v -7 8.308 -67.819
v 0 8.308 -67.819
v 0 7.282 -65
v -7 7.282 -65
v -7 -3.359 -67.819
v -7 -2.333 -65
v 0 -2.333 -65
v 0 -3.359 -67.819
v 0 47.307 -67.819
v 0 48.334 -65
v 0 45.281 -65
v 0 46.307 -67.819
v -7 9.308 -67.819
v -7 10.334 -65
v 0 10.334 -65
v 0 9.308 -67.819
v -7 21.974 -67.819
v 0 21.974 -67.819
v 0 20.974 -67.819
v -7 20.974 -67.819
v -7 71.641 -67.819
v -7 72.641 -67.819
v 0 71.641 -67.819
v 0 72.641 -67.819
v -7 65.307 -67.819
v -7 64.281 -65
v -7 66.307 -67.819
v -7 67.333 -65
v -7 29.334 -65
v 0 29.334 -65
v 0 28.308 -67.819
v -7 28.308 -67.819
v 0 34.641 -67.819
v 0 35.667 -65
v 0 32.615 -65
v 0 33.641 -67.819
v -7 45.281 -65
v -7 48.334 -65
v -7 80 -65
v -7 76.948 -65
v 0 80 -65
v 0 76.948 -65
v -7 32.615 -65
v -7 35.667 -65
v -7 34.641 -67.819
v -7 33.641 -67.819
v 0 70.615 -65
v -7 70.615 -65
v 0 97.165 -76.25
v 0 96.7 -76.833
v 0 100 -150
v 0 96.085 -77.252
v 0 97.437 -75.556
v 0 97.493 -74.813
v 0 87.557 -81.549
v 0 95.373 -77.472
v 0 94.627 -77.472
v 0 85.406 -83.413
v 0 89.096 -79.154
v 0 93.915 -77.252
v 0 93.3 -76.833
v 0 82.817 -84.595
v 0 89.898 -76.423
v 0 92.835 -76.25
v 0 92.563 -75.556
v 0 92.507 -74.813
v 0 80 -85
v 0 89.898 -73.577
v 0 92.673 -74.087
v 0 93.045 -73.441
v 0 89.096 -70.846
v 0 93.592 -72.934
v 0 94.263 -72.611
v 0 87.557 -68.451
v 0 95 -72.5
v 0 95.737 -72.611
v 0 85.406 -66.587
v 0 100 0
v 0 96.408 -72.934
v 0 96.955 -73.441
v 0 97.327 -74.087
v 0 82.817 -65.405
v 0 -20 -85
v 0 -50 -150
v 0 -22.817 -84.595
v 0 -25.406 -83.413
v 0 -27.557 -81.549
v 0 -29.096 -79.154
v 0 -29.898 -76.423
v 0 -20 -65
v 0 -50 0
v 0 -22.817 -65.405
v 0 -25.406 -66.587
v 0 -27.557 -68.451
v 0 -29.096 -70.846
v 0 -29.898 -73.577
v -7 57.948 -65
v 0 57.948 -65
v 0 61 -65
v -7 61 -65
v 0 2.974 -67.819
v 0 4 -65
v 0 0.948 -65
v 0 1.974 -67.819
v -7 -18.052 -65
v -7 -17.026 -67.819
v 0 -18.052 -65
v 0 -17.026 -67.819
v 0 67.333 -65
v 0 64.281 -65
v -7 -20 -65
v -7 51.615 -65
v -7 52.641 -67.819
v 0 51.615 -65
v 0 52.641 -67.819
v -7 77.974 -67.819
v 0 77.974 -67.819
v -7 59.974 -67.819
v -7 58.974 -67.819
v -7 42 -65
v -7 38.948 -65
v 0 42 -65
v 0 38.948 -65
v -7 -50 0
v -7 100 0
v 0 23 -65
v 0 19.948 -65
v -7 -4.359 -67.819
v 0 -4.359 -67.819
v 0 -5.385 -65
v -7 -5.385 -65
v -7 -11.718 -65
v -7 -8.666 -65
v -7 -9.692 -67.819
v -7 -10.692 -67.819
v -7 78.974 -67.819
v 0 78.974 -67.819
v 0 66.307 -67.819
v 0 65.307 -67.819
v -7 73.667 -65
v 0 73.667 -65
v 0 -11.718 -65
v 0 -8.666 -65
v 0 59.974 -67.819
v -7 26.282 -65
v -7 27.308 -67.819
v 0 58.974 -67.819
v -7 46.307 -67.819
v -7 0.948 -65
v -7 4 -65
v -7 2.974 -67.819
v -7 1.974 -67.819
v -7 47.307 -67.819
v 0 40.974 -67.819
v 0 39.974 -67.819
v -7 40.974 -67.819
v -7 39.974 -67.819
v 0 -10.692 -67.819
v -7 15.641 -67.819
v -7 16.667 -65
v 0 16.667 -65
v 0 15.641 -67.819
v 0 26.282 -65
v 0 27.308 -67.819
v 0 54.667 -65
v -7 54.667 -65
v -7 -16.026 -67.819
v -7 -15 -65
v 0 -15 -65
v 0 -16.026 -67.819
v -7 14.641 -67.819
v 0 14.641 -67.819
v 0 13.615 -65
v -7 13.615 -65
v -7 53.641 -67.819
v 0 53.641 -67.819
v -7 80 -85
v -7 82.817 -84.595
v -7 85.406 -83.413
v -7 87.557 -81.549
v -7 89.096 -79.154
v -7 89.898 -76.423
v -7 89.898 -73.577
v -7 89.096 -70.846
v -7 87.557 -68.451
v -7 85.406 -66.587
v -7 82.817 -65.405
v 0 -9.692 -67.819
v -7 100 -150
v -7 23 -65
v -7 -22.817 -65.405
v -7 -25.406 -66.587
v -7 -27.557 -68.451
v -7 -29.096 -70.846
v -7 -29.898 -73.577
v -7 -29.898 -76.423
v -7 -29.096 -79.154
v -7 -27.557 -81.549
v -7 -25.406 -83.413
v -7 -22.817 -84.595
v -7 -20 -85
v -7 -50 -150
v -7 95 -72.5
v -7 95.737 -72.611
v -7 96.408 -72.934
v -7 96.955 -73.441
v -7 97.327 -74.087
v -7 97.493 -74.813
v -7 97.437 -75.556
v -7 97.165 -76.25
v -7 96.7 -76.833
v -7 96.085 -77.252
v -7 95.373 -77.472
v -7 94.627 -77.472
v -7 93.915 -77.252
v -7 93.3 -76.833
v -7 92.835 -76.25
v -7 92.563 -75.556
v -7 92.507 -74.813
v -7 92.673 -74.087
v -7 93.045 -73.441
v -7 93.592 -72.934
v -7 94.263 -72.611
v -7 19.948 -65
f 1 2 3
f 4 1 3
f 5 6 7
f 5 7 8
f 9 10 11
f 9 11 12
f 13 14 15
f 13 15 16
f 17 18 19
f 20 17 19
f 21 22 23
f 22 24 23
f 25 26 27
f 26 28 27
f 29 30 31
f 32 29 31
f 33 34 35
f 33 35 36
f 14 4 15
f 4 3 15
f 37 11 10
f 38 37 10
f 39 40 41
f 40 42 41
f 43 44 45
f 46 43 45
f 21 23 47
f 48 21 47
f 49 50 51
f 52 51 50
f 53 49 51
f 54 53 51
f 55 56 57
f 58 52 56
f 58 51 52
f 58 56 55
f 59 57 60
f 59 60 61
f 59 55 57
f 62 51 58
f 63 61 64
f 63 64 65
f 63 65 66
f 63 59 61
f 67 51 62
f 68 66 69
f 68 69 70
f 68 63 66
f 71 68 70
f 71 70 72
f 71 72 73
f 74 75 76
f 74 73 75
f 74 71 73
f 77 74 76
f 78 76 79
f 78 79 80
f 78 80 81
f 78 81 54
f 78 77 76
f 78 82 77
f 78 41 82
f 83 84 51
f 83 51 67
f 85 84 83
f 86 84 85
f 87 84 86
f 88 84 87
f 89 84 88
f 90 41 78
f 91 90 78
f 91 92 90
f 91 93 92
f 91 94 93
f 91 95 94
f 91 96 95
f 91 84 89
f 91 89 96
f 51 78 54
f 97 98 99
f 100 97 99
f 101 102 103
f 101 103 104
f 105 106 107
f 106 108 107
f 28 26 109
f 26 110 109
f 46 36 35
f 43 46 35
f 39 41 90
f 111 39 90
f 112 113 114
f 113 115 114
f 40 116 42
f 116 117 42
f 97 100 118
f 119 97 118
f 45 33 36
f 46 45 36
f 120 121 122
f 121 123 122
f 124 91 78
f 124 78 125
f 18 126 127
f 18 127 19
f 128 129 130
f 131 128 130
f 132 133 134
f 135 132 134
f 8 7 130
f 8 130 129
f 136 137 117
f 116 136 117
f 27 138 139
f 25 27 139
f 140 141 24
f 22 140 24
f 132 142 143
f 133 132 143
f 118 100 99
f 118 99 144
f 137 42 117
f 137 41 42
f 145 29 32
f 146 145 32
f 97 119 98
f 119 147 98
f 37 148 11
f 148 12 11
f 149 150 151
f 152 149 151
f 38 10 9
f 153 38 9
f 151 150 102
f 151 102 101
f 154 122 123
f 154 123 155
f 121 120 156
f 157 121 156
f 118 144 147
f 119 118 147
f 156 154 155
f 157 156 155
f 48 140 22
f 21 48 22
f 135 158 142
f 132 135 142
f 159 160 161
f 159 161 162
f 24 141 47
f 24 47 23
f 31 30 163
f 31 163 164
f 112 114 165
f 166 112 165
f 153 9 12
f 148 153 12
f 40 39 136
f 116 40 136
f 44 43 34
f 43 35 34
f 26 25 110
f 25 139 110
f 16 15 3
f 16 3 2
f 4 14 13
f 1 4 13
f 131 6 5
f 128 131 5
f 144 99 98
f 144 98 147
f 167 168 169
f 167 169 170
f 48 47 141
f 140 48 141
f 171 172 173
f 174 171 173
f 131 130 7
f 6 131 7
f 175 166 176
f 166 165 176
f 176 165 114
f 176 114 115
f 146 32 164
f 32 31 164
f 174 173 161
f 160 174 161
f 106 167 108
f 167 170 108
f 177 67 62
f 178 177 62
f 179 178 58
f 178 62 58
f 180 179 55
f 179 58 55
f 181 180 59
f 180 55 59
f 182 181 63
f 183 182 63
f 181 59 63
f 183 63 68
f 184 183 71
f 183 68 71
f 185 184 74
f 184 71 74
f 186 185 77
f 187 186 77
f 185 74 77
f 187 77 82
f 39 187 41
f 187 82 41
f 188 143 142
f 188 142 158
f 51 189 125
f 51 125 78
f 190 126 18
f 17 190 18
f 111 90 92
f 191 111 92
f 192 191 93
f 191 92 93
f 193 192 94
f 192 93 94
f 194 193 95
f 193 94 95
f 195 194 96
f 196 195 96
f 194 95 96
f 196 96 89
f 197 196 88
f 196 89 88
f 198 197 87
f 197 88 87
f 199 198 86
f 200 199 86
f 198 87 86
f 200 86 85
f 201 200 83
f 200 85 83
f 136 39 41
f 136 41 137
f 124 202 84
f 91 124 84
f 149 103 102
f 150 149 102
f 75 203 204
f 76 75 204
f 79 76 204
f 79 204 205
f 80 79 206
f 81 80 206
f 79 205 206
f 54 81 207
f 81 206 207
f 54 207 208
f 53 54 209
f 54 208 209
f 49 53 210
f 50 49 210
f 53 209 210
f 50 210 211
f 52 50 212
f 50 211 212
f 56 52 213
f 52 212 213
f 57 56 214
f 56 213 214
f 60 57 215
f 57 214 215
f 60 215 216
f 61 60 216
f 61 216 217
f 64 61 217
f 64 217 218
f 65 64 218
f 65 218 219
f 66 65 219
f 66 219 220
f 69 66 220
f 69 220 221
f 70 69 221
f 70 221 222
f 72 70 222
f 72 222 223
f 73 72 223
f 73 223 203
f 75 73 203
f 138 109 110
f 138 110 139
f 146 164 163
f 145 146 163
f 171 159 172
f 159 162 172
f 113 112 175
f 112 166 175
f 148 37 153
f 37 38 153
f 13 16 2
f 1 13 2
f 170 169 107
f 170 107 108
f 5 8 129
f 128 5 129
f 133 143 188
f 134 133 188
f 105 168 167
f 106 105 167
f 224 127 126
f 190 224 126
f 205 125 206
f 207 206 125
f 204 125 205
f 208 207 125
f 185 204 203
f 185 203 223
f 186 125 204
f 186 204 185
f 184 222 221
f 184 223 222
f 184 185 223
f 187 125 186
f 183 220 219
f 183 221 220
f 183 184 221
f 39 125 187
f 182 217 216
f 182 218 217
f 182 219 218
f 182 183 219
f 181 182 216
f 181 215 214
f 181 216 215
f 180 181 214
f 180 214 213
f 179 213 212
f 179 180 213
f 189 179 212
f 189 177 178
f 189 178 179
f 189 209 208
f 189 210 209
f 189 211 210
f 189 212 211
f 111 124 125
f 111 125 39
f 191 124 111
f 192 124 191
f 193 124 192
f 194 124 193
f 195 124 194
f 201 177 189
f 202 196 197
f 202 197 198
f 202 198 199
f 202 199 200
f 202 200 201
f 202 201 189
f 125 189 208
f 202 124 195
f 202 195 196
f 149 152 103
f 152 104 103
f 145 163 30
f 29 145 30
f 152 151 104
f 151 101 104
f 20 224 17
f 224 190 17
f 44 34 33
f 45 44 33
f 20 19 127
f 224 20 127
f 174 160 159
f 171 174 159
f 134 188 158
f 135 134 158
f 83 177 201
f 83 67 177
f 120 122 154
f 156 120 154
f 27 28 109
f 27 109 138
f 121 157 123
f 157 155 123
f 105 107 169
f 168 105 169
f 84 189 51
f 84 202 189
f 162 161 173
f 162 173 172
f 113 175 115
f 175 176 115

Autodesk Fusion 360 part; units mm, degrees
sketch "Sketch1" plane through (0, 0, 0) normal (0, 1, 0) x (1, 0, 0)
  line L0 (-7, 150) -> (0, 150)
  line L1 (0, 150) -> (0, 0)
  line L2 (0, 0) -> (-7, 0)
  line L3 (-7, 0) -> (-7, 150)
  dimension "d1" = 7
  dimension "d2" = 150
extrude "Extrude1" add sketch "Sketch1" along normal blind 100 and the other way blind 50 makes body 1
sketch "Sketch3" plane through (0, 0, 0) normal (1, 0, 0) x (0, 0, -1)
  line L0 (150, -50) -> (150, 100)
  line L1 (150, 100) -> (0, 100)
  line L2 (0, 100) -> (0, -50)
  line L3 (0, -50) -> (150, -50)
  line L4 (65, 80) -> (65, -20)
  line L5 (85, 80) -> (85, -20)
  arc A0 (85, 80) -> (65, 80) centre (75, 80) ccw
  arc A1 (65, -20) -> (85, -20) centre (75, -20) ccw
  dimension "d5" = 100
  dimension "d6" = 100
  dimension "d9" = 20
  dimension "d10" = 65
extrude "Extrude2" cut sketch "Sketch3" against normal blind 60 contours L4 L5 A0 A1 bodies 1
sketch "草图4" plane through (-7, 0, 0) normal (-1, 0, 0) x (0, 0, 1)
  line L0 (-65, 80) -> (-65, -20)
  arc A0 (-85, -20) -> (-65, -20) centre (-75, -20) ccw
  line L1 (-85, -20) -> (-85, 80)
  arc A1 (-65, 80) -> (-85, 80) centre (-75, 80) ccw
  line L2 (0, -50) -> (0, 100)
  line L3 (0, 100) -> (-150, 100)
  line L4 (-150, 100) -> (-150, -50)
  line L5 (-150, -50) -> (0, -50)
  circle A2 centre (-75, 95) radius 2.5
  dimension "d13" = 5
  dimension "d14" = 5
extrude "拉伸3" cut sketch "草图4" against normal through all contours A2 bodies 1
sketch "草图5" plane through (0, 0, 0) normal (1, 0, 0) x (0, 0, -1)
  circle A0 centre (75, 95) radius 2.5
  line L0 (65, -20) -> (65, 80)
  arc A1 (85, 80) -> (65, 80) centre (75, 80) ccw
  line L1 (85, 80) -> (85, -20)
  arc A2 (65, -20) -> (85, -20) centre (75, -20) ccw
  line L2 (150, -50) -> (150, 100)
  line L3 (150, 100) -> (0, 100)
  line L4 (0, 100) -> (0, -50)
  line L5 (0, -50) -> (150, -50)
  line L6 (65, 80) -> (67.8191, 78.9739)
  line L7 (65, 80) -> (70, 80) construction
  line L8 (67.8191, 78.9739) -> (67.8191, 77.9739)
  line L9 (67.8191, 77.9739) -> (65, 76.9479)
  line L10 (67.8191, 77.9739) -> (74.6985, 77.9739) construction
  line L11 (65, 80) -> (65, 76.9479)
  dimension "d16" = 20
  dimension "d17" = 3
  dimension "d18" = 1
  dimension "d19" = 160
  dimension "d20" = 3
extrude "拉伸4" add sketch "草图5" against normal blind 7 separate body contours L0 L6 L8 L9 L11 makes body 2
pattern_linear "R-阵列1" count 16 spacing 6.3333 along (0, -1, 0) of "拉伸4" makes body 3 at (-2.3333, 71.6319, -65) makes body 4 at (-4.6667, 65.2986, -65) makes body 5 at (-2.3333, 58.9653, -65) makes body 6 at (-2.3333, 52.6319, -65) makes body 7 at (-2.3333, 46.2986, -65) makes body 8 at (-2.3333, 39.9653, -65) makes body 9 at (-2.3333, 33.6319, -65) makes body 10 at (-4.6667, 27.2986, -65) makes body 11 at (-2.3333, 20.9653, -65) makes body 12 at (-2.3333, 14.6319, -65) makes body 13 at (-2.3333, 8.2986, -65) makes body 14 at (-2.3333, 1.9653, -65) makes body 15 at (-2.3333, -4.3681, -65) makes body 16 at (-2.3333, -10.7014, -65) makes body 17 at (-2.3333, -17.0347, -65)
thread "螺纹1" "ISO Metric profile 5.0 M5x0.8 6H" major diameter 5.12 minor diameter 4.234 pitch 0.8 angle 60 resizes the face on face at (-2.3333, 94.0289, -77.3037) on bodies 1
